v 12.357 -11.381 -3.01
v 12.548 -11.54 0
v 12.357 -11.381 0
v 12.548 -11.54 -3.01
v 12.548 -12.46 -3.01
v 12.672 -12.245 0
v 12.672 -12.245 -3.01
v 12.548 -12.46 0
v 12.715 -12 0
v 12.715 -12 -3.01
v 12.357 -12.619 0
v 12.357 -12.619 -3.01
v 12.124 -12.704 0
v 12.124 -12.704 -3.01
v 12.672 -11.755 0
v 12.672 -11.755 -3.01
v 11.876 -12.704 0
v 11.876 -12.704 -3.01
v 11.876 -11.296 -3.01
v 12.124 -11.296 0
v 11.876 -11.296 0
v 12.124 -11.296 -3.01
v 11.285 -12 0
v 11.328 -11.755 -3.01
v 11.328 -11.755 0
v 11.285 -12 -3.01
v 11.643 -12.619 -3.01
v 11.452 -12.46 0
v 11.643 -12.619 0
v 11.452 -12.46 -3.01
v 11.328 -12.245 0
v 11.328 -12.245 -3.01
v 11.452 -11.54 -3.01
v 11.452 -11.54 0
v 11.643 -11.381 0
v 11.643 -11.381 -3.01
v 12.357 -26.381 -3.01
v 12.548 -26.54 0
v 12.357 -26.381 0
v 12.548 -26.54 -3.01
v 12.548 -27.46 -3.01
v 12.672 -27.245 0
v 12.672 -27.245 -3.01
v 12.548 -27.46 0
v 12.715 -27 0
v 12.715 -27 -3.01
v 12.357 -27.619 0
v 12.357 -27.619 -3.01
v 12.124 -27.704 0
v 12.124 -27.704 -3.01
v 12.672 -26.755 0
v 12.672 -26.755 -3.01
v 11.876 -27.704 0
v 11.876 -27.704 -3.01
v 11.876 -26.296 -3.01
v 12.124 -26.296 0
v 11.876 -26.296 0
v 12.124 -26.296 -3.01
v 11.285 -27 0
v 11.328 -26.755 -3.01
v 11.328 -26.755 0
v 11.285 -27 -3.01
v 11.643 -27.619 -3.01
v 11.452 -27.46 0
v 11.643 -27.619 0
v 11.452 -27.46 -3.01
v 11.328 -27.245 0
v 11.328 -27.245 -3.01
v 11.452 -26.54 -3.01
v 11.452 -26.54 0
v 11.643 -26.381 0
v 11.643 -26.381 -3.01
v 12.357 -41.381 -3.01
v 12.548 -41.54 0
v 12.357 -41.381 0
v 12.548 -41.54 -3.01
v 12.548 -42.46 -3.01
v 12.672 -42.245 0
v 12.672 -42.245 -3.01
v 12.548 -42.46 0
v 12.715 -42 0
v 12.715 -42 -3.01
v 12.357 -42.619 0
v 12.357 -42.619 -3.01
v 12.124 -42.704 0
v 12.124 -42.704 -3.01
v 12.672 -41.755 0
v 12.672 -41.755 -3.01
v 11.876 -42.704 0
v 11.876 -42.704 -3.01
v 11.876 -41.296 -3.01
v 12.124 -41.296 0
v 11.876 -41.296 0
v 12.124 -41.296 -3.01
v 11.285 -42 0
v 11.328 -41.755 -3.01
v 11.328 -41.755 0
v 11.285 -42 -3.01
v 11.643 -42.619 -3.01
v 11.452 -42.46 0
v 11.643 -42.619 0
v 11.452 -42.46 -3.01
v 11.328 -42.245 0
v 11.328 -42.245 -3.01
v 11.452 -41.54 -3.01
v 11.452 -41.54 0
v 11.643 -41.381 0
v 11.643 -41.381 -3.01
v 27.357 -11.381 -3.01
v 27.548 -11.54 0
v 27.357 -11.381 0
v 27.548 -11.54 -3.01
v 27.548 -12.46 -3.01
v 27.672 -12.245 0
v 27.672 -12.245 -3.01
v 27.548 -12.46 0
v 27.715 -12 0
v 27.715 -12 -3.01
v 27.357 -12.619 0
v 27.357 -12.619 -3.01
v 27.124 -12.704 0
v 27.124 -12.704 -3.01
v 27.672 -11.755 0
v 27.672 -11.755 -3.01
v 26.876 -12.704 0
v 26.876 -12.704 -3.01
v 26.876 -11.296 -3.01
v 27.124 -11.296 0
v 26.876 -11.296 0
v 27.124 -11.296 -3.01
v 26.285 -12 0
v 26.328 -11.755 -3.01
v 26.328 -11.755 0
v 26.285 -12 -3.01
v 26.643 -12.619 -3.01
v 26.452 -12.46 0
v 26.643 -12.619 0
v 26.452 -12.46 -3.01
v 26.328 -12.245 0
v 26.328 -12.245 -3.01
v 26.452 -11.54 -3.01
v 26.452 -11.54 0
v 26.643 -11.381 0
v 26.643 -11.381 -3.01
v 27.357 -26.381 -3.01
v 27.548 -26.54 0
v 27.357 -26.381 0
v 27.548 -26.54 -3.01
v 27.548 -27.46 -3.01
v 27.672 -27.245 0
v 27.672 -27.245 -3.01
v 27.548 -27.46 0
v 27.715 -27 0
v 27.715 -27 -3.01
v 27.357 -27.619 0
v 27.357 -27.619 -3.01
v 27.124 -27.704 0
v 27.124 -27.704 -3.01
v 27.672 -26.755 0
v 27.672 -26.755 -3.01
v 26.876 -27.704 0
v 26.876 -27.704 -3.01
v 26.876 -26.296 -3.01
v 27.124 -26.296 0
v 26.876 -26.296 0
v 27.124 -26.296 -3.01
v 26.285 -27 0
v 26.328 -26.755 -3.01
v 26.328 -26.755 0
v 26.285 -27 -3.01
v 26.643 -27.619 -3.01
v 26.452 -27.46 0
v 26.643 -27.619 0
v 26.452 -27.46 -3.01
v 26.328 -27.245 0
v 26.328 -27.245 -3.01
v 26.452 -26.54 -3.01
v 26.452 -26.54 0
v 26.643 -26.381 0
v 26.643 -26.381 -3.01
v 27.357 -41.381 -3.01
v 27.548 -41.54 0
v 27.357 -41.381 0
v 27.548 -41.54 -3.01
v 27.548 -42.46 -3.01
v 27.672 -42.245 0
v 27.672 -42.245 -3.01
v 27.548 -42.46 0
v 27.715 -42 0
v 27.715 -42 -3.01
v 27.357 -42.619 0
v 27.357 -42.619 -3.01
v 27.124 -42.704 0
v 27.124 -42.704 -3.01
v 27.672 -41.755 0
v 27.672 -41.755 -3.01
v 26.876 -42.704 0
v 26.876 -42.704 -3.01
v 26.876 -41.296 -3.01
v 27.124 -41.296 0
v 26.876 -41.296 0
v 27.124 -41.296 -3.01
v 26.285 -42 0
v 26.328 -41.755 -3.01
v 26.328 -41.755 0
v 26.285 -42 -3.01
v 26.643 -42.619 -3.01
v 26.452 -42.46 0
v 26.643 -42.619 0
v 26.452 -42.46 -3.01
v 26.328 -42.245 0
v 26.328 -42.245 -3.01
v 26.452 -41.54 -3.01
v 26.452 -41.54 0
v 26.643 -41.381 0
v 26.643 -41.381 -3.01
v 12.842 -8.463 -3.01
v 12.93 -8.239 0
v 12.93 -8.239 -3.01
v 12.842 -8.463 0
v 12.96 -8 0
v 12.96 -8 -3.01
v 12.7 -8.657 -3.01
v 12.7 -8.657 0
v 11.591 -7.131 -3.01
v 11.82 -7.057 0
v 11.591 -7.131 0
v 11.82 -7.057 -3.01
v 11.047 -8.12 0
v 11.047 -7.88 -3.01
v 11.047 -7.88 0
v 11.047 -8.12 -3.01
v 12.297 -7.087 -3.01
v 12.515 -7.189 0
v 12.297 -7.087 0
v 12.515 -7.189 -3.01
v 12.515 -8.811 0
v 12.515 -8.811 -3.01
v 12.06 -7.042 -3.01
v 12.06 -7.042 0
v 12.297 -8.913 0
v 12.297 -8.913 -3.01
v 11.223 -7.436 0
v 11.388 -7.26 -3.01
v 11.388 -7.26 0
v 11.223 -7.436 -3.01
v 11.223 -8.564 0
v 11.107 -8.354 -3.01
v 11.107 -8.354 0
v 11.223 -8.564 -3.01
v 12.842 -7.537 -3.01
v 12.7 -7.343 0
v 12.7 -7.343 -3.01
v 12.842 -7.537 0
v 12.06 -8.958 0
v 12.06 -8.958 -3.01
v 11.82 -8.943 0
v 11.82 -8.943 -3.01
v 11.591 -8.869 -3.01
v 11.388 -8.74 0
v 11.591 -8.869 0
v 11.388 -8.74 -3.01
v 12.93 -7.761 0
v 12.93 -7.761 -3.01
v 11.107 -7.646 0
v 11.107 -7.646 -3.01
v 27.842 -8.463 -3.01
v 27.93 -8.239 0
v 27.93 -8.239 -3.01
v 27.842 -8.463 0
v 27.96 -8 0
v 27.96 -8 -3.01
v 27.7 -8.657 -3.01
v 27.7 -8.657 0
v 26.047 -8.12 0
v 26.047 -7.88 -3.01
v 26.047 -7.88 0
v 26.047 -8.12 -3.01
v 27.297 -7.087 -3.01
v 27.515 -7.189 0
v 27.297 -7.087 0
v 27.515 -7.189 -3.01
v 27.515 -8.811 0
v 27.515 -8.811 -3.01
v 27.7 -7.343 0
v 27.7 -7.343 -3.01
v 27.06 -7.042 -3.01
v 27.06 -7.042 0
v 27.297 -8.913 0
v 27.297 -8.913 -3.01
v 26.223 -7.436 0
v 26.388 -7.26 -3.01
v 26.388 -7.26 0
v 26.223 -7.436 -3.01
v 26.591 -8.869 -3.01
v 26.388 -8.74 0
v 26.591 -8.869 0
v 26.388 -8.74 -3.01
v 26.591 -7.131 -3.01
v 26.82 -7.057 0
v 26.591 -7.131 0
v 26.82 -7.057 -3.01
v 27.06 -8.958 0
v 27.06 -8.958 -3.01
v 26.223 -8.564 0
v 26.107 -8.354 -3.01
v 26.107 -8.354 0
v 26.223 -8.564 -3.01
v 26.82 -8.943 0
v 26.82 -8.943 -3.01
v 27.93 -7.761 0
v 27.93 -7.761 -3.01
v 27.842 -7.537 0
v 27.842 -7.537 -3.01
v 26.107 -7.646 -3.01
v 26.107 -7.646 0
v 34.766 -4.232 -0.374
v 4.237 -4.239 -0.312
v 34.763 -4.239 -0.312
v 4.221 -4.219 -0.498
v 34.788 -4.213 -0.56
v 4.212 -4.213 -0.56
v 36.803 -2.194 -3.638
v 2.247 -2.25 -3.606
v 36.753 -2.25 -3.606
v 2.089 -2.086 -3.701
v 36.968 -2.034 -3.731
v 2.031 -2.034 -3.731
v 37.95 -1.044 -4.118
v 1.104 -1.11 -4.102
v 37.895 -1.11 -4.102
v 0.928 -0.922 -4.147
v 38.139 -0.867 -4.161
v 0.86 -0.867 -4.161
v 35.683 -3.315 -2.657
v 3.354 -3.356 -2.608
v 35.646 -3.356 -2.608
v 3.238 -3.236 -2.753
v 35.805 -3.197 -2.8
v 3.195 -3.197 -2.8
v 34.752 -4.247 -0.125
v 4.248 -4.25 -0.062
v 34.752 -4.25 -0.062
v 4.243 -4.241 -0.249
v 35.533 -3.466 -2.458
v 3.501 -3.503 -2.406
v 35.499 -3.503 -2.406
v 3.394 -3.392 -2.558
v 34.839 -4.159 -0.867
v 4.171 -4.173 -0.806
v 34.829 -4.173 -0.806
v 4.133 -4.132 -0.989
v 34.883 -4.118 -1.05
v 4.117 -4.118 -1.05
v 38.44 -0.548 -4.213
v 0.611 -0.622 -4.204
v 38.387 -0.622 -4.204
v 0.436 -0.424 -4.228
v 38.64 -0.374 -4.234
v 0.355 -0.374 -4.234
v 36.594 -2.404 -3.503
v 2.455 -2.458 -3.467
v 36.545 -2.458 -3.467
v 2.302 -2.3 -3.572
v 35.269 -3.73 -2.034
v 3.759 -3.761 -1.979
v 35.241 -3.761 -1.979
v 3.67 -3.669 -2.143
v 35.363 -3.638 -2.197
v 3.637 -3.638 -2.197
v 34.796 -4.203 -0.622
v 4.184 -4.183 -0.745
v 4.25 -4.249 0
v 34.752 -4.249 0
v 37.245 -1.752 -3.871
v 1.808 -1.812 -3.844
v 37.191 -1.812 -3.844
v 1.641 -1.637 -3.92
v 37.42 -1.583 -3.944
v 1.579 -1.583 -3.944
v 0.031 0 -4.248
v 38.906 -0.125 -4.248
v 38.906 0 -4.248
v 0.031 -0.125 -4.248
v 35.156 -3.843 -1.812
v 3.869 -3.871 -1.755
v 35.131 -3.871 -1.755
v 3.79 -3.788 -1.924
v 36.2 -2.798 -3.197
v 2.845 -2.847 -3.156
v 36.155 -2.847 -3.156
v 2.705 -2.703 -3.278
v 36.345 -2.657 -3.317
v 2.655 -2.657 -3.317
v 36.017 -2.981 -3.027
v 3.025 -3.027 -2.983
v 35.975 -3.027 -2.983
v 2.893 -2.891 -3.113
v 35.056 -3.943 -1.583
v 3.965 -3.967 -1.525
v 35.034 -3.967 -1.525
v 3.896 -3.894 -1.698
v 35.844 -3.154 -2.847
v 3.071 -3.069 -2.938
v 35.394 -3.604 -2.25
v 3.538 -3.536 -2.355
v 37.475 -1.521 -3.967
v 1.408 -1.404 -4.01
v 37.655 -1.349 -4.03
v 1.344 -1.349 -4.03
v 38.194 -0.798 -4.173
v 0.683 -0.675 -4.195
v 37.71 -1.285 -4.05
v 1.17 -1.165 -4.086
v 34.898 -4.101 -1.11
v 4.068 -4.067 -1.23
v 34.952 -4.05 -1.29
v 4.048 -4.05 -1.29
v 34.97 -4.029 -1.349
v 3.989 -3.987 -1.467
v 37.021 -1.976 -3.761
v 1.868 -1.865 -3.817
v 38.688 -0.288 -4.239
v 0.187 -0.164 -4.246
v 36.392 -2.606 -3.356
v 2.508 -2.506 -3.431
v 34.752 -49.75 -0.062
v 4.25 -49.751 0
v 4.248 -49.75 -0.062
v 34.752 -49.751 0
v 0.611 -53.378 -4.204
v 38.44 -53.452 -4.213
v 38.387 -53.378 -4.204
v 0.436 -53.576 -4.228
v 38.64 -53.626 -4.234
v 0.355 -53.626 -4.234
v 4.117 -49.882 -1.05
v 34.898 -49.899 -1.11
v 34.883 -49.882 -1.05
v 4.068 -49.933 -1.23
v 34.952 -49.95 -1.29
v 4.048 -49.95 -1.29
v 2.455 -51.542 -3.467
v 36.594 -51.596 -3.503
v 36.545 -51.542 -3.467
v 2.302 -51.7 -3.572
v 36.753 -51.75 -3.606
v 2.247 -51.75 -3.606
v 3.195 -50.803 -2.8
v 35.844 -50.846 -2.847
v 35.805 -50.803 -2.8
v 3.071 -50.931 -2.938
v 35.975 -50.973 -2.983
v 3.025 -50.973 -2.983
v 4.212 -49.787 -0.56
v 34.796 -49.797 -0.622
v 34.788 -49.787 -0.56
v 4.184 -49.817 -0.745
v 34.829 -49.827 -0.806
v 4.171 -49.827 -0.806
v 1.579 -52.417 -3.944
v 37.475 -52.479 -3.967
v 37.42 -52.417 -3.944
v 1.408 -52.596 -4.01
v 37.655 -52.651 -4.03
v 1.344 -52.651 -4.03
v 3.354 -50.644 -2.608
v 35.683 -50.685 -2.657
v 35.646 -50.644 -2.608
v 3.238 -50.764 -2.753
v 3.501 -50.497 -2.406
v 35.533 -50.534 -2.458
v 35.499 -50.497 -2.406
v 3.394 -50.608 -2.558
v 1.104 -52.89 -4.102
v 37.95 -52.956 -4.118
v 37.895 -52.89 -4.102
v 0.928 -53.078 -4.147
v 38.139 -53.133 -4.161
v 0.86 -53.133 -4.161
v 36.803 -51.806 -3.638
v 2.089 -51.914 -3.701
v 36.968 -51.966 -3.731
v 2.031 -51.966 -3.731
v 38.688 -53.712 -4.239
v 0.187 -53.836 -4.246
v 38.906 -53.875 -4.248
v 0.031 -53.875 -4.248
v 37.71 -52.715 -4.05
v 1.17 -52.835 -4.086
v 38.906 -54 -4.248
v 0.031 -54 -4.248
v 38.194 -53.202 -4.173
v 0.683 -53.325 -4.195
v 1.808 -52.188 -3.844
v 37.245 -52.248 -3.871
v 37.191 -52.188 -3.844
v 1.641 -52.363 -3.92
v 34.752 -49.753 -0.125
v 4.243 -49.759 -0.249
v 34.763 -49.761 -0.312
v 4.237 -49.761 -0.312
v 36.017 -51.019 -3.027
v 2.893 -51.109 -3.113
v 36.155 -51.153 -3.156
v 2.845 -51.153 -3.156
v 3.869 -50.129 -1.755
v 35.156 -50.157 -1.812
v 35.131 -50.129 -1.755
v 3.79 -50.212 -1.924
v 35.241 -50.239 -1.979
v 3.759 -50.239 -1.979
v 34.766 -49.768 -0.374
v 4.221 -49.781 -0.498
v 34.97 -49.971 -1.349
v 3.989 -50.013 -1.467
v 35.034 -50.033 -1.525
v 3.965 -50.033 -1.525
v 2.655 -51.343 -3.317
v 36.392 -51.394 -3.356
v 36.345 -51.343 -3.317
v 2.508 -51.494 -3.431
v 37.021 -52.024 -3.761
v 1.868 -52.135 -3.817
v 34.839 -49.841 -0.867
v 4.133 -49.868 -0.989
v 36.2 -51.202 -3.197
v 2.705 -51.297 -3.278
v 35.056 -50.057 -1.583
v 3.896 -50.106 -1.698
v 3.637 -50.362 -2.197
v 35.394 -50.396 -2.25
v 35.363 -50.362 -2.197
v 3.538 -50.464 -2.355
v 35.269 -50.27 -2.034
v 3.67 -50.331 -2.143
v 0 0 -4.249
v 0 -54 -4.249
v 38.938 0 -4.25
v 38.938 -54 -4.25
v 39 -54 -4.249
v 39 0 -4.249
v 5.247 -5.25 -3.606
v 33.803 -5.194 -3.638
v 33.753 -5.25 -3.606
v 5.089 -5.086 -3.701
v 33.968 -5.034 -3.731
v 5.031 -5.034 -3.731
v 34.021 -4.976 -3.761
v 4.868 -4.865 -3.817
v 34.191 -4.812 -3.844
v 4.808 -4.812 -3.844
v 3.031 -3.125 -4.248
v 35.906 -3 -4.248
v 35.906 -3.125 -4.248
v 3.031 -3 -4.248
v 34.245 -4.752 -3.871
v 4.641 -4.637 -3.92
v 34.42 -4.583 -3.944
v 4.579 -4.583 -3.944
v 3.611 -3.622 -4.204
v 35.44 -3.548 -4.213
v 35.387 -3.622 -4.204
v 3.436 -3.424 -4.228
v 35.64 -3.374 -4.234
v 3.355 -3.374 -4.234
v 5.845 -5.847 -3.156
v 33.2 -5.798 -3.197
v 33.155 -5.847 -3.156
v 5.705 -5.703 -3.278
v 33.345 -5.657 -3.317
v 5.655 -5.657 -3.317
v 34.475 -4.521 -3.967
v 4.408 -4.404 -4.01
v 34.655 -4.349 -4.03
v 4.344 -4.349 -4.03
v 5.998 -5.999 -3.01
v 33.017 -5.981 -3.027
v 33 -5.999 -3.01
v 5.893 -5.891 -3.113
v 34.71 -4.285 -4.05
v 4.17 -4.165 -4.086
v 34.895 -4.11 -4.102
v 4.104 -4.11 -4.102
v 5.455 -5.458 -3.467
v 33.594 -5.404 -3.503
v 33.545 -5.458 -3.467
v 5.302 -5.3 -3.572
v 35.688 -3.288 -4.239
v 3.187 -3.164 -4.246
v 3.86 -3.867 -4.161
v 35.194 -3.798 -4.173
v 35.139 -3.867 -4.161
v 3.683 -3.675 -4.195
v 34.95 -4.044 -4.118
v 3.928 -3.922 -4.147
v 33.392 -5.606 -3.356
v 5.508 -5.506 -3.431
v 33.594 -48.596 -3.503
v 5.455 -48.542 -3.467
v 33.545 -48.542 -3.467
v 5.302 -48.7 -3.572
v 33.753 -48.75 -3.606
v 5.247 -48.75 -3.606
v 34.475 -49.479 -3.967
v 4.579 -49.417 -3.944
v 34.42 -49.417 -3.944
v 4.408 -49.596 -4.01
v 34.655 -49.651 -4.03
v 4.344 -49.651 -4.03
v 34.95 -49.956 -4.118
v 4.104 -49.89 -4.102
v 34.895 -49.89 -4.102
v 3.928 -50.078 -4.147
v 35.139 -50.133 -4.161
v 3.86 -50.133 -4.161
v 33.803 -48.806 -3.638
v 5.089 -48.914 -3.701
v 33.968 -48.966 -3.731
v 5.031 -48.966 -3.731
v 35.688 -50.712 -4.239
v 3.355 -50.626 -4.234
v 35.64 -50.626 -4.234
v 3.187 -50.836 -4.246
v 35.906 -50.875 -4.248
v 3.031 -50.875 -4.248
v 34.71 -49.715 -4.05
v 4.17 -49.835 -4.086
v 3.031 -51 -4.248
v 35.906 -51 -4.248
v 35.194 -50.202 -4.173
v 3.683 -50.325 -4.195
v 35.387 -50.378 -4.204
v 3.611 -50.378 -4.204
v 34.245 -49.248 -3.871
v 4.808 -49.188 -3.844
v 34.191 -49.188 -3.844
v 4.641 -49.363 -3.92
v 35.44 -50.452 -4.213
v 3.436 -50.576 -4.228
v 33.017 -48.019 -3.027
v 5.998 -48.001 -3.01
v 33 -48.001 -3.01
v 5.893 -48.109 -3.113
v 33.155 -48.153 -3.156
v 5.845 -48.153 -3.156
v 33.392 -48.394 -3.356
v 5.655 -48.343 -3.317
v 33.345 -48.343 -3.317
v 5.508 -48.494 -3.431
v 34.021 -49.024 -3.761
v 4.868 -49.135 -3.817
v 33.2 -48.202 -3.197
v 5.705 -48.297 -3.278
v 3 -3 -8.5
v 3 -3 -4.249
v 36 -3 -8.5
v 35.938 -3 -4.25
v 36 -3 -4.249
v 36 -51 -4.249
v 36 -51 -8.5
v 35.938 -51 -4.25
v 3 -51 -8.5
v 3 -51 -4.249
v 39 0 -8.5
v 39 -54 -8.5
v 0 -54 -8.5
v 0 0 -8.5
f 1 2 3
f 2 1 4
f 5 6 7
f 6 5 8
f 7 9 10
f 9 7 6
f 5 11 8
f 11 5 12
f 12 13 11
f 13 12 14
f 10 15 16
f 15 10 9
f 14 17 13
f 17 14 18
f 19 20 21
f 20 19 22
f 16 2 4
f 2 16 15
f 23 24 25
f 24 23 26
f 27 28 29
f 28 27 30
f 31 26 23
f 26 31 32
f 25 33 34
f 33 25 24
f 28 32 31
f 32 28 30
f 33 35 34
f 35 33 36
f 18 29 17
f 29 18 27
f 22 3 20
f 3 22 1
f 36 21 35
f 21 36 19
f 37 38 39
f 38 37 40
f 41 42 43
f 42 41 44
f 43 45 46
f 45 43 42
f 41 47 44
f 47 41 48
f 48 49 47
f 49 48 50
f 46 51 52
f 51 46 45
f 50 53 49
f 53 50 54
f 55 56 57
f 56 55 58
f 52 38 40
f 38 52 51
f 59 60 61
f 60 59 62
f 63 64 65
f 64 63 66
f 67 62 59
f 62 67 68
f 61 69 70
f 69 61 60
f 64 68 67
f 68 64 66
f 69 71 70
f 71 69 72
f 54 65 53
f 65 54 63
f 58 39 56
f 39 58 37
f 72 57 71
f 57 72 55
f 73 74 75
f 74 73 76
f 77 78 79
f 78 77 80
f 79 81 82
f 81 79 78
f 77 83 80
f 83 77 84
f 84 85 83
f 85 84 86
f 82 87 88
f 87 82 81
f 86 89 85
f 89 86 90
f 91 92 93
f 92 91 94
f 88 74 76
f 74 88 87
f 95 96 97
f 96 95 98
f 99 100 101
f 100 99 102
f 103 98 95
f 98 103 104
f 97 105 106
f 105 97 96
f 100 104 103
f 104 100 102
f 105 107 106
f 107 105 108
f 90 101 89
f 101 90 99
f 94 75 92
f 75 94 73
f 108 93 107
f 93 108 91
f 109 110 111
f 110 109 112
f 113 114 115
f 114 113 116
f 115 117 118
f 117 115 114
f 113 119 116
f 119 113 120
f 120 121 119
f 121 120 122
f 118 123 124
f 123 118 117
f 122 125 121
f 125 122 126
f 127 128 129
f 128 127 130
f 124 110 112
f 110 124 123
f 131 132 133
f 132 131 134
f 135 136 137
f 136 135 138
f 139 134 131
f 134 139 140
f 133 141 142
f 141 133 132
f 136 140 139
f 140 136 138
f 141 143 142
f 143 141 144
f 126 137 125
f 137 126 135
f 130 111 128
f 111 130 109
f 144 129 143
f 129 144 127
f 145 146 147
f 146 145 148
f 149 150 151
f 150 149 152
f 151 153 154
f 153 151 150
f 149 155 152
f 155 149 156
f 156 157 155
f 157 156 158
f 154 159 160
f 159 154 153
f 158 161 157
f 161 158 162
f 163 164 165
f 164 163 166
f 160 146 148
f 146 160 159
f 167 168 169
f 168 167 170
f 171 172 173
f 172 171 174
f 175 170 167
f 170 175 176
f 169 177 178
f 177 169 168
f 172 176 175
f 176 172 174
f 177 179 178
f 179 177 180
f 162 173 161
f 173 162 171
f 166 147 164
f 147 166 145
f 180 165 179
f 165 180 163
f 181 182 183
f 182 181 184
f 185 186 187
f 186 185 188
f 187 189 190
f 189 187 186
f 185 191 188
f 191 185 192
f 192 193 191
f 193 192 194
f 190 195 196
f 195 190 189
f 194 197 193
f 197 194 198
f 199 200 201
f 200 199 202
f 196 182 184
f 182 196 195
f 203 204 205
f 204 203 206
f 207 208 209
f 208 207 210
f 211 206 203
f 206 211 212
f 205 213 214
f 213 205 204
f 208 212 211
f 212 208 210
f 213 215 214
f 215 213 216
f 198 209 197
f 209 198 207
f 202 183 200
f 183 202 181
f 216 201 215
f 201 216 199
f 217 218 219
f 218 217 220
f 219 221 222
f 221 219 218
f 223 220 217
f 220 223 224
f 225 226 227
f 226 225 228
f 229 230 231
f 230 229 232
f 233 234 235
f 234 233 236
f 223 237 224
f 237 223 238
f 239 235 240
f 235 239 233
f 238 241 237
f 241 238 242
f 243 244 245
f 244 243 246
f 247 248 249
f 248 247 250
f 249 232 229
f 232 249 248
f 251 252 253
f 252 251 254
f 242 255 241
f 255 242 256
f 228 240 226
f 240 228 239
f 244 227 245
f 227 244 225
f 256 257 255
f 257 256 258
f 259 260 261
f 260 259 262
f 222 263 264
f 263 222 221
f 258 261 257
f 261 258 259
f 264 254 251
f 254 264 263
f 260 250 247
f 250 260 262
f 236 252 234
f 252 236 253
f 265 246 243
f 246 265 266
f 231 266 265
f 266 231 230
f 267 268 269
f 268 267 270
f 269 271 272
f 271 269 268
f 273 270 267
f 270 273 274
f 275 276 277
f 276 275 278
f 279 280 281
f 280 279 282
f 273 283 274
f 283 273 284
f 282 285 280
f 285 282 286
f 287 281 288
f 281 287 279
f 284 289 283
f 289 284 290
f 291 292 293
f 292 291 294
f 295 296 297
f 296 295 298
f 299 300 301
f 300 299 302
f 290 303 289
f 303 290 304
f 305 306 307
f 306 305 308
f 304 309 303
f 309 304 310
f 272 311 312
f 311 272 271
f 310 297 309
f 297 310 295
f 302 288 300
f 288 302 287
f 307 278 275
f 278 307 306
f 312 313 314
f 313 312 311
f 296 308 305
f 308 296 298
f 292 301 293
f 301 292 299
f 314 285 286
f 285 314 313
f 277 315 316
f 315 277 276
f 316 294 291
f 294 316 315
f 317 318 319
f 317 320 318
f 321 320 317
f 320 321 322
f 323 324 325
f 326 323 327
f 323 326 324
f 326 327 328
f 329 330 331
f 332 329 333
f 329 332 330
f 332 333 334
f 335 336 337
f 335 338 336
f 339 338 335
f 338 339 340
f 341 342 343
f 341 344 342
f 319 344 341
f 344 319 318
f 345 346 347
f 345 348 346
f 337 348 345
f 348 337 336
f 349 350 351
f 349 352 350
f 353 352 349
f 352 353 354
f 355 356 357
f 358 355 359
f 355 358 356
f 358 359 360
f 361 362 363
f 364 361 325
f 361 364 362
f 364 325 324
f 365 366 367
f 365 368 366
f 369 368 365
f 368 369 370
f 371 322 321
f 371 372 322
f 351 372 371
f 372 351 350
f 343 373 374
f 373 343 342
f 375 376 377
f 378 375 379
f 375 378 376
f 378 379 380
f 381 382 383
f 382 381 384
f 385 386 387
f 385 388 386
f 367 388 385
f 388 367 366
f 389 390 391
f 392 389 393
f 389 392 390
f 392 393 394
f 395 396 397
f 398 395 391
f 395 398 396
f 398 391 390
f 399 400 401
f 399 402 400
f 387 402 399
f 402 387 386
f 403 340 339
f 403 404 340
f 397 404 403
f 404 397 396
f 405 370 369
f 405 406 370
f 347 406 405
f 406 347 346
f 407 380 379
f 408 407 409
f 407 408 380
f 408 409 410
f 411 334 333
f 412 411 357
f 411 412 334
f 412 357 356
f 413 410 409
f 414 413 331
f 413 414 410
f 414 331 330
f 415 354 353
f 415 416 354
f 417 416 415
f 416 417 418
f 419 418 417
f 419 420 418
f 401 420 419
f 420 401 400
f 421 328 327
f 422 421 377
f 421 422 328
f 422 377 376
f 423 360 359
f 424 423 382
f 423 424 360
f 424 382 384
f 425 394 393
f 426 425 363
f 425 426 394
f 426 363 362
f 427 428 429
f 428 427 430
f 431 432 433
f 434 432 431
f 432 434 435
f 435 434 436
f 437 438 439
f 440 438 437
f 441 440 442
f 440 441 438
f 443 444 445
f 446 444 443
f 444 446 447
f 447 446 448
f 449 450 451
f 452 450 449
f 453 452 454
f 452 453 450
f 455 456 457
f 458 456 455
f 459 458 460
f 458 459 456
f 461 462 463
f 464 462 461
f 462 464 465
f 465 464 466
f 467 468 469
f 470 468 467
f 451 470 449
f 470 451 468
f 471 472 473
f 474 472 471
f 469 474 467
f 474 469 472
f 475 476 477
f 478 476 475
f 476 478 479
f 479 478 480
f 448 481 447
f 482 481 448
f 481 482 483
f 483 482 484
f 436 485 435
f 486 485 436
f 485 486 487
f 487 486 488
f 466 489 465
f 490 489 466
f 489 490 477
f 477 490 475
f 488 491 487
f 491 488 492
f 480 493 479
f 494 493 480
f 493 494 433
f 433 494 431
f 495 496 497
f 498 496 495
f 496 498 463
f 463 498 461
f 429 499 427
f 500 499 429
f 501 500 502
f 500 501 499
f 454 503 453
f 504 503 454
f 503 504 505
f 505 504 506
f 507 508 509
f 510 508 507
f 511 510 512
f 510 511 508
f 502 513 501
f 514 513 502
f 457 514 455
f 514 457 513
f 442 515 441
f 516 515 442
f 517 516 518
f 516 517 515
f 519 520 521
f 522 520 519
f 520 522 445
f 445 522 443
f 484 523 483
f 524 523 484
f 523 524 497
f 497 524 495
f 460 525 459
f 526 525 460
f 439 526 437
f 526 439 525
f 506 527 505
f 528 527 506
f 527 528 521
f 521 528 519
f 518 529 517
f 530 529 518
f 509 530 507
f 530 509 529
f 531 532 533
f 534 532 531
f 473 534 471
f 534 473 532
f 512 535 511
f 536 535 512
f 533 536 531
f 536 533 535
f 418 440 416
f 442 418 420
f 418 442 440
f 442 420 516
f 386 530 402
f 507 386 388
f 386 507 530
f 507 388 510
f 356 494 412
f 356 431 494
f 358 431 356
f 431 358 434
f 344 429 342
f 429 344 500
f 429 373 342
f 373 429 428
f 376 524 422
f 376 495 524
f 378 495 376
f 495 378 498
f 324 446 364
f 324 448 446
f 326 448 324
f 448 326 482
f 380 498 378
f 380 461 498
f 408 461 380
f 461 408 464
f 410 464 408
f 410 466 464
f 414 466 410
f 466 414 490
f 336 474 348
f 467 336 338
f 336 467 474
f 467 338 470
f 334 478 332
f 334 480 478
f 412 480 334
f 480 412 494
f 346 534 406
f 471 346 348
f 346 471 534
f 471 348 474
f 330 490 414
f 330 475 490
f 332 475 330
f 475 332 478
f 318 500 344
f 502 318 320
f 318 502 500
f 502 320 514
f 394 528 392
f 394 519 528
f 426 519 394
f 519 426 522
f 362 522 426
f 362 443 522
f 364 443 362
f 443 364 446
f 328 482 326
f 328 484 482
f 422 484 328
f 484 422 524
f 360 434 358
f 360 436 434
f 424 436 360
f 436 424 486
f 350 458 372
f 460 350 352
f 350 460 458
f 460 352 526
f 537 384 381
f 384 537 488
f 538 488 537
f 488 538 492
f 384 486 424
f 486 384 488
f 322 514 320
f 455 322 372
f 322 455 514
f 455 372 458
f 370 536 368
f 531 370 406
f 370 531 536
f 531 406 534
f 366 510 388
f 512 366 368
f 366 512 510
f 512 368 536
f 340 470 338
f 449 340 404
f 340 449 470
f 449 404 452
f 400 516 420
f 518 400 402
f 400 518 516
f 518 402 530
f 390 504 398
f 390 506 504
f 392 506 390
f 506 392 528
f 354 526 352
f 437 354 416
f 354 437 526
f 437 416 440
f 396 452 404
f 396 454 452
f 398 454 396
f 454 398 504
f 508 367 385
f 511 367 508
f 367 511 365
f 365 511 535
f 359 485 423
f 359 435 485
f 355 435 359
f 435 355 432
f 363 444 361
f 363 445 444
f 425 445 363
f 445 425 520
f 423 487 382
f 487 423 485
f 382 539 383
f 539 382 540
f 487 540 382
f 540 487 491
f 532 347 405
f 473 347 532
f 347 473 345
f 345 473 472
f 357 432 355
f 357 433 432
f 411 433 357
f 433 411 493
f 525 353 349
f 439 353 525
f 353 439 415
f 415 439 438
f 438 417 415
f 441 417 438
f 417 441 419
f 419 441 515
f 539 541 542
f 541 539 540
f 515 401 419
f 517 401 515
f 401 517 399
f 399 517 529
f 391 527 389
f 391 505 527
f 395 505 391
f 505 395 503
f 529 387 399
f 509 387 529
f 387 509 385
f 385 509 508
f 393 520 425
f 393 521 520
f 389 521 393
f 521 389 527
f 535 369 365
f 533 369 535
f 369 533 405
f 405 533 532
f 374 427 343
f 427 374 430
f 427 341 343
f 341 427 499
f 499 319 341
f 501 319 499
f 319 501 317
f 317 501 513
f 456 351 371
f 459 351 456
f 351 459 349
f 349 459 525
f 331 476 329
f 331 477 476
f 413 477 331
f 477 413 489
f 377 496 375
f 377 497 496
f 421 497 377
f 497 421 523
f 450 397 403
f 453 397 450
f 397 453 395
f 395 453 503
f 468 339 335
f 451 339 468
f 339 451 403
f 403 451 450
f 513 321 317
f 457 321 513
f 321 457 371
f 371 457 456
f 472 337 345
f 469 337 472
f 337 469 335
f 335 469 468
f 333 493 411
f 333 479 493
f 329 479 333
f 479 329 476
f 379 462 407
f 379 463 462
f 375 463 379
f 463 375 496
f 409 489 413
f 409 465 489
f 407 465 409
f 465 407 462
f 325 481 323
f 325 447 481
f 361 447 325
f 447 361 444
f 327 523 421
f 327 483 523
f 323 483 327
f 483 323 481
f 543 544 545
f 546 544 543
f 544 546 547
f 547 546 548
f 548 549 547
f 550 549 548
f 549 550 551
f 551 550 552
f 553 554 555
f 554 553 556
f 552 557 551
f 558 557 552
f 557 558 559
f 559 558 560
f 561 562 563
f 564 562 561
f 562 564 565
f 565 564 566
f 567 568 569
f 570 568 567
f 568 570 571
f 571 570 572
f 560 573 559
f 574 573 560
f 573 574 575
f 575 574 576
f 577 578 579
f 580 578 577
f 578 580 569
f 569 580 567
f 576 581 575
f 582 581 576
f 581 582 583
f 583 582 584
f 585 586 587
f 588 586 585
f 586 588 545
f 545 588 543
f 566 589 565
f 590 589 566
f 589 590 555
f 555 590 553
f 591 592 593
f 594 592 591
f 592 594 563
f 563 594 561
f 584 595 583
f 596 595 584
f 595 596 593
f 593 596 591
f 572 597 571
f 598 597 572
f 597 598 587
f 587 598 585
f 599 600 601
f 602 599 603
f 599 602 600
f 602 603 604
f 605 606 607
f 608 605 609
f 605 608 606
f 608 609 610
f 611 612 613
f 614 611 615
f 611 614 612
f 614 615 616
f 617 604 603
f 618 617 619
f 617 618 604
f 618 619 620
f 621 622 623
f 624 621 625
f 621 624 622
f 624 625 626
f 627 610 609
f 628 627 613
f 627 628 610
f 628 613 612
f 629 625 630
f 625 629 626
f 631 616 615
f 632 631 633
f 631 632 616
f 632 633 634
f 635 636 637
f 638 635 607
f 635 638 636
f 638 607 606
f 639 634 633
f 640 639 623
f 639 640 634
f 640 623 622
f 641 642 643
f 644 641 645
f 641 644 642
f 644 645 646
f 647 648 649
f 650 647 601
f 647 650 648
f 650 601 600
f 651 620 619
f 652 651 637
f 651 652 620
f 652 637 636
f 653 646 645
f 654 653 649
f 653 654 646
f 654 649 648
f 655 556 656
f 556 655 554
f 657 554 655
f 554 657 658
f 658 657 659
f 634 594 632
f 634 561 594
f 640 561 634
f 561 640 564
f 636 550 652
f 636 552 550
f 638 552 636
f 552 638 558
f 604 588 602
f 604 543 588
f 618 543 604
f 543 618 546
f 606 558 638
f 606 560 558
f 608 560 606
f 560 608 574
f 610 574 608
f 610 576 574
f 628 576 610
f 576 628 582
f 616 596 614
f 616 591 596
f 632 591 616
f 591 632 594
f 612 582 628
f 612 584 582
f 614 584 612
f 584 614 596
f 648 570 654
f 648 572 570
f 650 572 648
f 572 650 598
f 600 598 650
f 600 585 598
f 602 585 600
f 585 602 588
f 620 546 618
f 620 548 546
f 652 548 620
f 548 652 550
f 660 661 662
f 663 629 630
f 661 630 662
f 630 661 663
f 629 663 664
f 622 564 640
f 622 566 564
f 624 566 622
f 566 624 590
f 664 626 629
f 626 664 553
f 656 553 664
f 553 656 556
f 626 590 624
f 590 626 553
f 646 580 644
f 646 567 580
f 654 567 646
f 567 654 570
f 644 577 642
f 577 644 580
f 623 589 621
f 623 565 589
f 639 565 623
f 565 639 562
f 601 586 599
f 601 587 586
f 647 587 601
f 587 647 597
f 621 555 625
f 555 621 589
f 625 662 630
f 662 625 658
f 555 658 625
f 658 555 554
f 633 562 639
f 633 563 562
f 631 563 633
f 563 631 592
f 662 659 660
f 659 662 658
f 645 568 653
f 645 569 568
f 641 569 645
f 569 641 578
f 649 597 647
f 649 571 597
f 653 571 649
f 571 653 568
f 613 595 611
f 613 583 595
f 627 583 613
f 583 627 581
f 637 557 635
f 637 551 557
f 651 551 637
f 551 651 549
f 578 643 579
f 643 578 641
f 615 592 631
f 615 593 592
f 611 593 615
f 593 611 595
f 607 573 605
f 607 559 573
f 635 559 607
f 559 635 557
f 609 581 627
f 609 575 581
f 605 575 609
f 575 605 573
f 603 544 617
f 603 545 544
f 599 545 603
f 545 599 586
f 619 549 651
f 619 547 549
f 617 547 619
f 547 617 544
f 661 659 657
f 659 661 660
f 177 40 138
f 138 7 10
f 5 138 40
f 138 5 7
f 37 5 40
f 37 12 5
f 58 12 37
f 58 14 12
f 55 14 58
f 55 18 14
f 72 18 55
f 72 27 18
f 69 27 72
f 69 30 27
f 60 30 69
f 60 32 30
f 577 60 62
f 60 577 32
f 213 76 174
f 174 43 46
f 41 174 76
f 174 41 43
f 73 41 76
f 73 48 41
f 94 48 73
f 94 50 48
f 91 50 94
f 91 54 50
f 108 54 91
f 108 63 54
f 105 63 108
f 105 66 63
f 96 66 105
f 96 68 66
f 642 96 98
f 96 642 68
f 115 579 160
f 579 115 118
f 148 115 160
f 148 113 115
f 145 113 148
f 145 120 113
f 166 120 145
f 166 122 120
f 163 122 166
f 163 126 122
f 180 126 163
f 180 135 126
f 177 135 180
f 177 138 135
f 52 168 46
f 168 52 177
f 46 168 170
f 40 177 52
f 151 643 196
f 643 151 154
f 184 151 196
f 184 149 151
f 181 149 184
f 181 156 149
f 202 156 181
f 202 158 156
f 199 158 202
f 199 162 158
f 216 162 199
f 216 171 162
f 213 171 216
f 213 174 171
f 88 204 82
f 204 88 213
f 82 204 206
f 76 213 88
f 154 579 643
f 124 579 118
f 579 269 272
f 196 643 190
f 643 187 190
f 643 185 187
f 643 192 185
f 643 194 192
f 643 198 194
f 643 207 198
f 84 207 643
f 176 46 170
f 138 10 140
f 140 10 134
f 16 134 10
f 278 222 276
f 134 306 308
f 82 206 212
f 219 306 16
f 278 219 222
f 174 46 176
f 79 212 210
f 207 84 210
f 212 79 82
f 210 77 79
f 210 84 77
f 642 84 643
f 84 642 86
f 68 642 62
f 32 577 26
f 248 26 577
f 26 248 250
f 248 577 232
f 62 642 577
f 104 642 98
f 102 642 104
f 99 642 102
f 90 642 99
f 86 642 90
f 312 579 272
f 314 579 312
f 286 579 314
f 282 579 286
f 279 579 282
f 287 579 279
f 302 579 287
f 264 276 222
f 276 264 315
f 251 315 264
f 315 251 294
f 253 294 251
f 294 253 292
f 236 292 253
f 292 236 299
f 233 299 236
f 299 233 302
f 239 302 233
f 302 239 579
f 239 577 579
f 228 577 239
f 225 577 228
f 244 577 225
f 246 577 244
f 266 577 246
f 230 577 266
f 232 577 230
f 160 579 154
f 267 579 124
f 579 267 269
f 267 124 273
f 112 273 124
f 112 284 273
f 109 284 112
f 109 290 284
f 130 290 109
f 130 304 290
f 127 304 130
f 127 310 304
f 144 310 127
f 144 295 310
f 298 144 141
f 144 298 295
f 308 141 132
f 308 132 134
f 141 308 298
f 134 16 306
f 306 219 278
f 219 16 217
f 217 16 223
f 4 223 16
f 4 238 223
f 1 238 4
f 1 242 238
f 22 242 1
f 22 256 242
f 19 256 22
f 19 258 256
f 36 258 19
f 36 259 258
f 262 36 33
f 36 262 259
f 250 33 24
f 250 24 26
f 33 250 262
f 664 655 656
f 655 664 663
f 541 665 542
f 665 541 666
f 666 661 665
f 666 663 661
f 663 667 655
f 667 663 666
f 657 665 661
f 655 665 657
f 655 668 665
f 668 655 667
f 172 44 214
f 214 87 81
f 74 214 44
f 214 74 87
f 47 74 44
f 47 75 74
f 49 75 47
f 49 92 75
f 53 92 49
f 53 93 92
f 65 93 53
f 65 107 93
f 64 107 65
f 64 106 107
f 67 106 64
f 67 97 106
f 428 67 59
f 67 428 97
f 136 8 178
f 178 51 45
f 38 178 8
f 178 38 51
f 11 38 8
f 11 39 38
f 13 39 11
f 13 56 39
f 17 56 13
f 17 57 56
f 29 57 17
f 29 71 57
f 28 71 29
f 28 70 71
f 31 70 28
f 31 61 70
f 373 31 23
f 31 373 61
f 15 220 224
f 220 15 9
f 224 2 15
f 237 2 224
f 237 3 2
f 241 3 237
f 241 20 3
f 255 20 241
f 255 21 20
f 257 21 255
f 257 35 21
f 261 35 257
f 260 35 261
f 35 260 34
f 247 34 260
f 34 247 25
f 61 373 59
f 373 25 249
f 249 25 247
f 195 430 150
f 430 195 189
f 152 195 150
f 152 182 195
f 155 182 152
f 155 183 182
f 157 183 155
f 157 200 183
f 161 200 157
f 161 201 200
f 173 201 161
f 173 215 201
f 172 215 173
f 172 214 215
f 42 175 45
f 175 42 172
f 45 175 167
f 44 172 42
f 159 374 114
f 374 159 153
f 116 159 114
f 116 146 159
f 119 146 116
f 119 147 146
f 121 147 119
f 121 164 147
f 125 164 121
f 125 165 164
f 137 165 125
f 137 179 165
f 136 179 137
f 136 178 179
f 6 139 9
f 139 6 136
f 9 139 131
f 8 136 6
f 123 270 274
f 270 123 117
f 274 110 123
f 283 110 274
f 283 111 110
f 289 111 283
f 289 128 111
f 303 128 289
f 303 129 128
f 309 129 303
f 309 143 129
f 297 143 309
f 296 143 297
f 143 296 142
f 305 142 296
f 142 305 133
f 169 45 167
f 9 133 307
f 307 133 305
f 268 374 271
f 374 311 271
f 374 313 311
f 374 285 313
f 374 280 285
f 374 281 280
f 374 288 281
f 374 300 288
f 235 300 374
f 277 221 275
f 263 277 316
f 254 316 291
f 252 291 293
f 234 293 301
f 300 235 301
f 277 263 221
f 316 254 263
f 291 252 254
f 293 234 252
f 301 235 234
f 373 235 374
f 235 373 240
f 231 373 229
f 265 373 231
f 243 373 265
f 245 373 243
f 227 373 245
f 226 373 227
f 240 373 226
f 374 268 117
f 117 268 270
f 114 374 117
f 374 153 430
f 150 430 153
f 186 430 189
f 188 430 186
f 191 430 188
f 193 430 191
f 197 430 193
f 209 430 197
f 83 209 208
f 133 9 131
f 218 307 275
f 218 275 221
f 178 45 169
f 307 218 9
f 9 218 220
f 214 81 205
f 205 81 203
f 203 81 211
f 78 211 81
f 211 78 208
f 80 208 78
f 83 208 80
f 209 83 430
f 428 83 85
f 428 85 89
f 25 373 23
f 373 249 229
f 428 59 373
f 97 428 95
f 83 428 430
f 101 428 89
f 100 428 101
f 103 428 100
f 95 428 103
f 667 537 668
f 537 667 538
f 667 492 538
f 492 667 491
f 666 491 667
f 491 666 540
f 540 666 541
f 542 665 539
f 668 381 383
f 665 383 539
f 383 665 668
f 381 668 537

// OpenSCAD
// file: config.scad
$rows = 2;
$columns = 3;
$height = 8.5;
$distance = 15;
$gutter = 8;

$led_diameter = 3;
$led_height = 5;
$flange_height = 1;
$flange_diameter = 3.5;
$flange_flat_diameter = 3.4;
$snug_clearance = 0.2;
$lead_diameter = 0.5;

$wire_guide_distance = 5.5;
$wire_guide_height = 2.5;

function extent(holes) = (holes - 1) * $distance + 2 * $gutter;
function snugly(diameter) = diameter / cos(180 / fragments(diameter)) + 2 * $snug_clearance;
function fragments(diameter) = $fn > 0.0 ? max(3.0, $fn) : ceil(max(min(360.0 / $fa, diameter * PI / $fs), 5));
// main file
$fs = 0.25;
$fa = 1;

include <config.scad>;

module hole(multiplier) {
    translate([0, 0, -0.1]) cylinder(h = $height + 0.2, d = snugly(multiplier*$lead_diameter));
}

module base(rows, columns) {
    cube([extent(rows), extent(columns), $height]);
}

$thickness = 3;
$gutter = 12;

module decorative_edges(rows, columns, adjustment, smidge) {
    translate([-smidge + adjustment, adjustment, 0])
        rotate([0, 90, 0])
            cylinder(h = extent(rows) - 2 * adjustment + 2 * smidge, d = $height);
    translate([-smidge + adjustment, extent(columns) - adjustment, 0])
        rotate([0, 90, 0])
            cylinder(h = extent(rows) - 2 * adjustment + 2 * smidge, d = $height);

    translate([adjustment, -smidge + adjustment, 0])
        rotate([-90, 0, 0])
            cylinder(h = extent(columns) - 2 * adjustment + 2 * smidge, d = $height);
    translate([extent(rows) - adjustment, -smidge + adjustment, 0])
        rotate([-90, 0, 0])
            cylinder(h = extent(columns) - 2 * adjustment + 2 * smidge, d = $height);
}

module inside_base(rows, columns) {
    difference() {
        translate([$thickness, $thickness, $thickness + 0.01 ])
            cube([extent(rows) - 2*$thickness, extent(columns) - 2*$thickness, $height - $thickness]);

        decorative_edges(rows, columns, $thickness, 0);
    }
}

module cube_base(rows, columns) {
    union() {
        difference() {
            base(rows, columns);

            for (i = [0:rows - 1])
                for (j = [0:columns - 1])
                    translate([$gutter + i * $distance, $gutter + j * $distance, 0])
                        hole(2);
            for (i = [0:rows - 1])
                translate([$gutter + i * $distance, $gutter - 4, 0])
                    hole(3);

            decorative_edges(rows, columns, 0, 0.1);
            inside_base(rows, columns);
        }
    }
}


rotate([180,0,0])
    cube_base($rows, $columns);

// vim:set sts=4 sw=4 ai et:
